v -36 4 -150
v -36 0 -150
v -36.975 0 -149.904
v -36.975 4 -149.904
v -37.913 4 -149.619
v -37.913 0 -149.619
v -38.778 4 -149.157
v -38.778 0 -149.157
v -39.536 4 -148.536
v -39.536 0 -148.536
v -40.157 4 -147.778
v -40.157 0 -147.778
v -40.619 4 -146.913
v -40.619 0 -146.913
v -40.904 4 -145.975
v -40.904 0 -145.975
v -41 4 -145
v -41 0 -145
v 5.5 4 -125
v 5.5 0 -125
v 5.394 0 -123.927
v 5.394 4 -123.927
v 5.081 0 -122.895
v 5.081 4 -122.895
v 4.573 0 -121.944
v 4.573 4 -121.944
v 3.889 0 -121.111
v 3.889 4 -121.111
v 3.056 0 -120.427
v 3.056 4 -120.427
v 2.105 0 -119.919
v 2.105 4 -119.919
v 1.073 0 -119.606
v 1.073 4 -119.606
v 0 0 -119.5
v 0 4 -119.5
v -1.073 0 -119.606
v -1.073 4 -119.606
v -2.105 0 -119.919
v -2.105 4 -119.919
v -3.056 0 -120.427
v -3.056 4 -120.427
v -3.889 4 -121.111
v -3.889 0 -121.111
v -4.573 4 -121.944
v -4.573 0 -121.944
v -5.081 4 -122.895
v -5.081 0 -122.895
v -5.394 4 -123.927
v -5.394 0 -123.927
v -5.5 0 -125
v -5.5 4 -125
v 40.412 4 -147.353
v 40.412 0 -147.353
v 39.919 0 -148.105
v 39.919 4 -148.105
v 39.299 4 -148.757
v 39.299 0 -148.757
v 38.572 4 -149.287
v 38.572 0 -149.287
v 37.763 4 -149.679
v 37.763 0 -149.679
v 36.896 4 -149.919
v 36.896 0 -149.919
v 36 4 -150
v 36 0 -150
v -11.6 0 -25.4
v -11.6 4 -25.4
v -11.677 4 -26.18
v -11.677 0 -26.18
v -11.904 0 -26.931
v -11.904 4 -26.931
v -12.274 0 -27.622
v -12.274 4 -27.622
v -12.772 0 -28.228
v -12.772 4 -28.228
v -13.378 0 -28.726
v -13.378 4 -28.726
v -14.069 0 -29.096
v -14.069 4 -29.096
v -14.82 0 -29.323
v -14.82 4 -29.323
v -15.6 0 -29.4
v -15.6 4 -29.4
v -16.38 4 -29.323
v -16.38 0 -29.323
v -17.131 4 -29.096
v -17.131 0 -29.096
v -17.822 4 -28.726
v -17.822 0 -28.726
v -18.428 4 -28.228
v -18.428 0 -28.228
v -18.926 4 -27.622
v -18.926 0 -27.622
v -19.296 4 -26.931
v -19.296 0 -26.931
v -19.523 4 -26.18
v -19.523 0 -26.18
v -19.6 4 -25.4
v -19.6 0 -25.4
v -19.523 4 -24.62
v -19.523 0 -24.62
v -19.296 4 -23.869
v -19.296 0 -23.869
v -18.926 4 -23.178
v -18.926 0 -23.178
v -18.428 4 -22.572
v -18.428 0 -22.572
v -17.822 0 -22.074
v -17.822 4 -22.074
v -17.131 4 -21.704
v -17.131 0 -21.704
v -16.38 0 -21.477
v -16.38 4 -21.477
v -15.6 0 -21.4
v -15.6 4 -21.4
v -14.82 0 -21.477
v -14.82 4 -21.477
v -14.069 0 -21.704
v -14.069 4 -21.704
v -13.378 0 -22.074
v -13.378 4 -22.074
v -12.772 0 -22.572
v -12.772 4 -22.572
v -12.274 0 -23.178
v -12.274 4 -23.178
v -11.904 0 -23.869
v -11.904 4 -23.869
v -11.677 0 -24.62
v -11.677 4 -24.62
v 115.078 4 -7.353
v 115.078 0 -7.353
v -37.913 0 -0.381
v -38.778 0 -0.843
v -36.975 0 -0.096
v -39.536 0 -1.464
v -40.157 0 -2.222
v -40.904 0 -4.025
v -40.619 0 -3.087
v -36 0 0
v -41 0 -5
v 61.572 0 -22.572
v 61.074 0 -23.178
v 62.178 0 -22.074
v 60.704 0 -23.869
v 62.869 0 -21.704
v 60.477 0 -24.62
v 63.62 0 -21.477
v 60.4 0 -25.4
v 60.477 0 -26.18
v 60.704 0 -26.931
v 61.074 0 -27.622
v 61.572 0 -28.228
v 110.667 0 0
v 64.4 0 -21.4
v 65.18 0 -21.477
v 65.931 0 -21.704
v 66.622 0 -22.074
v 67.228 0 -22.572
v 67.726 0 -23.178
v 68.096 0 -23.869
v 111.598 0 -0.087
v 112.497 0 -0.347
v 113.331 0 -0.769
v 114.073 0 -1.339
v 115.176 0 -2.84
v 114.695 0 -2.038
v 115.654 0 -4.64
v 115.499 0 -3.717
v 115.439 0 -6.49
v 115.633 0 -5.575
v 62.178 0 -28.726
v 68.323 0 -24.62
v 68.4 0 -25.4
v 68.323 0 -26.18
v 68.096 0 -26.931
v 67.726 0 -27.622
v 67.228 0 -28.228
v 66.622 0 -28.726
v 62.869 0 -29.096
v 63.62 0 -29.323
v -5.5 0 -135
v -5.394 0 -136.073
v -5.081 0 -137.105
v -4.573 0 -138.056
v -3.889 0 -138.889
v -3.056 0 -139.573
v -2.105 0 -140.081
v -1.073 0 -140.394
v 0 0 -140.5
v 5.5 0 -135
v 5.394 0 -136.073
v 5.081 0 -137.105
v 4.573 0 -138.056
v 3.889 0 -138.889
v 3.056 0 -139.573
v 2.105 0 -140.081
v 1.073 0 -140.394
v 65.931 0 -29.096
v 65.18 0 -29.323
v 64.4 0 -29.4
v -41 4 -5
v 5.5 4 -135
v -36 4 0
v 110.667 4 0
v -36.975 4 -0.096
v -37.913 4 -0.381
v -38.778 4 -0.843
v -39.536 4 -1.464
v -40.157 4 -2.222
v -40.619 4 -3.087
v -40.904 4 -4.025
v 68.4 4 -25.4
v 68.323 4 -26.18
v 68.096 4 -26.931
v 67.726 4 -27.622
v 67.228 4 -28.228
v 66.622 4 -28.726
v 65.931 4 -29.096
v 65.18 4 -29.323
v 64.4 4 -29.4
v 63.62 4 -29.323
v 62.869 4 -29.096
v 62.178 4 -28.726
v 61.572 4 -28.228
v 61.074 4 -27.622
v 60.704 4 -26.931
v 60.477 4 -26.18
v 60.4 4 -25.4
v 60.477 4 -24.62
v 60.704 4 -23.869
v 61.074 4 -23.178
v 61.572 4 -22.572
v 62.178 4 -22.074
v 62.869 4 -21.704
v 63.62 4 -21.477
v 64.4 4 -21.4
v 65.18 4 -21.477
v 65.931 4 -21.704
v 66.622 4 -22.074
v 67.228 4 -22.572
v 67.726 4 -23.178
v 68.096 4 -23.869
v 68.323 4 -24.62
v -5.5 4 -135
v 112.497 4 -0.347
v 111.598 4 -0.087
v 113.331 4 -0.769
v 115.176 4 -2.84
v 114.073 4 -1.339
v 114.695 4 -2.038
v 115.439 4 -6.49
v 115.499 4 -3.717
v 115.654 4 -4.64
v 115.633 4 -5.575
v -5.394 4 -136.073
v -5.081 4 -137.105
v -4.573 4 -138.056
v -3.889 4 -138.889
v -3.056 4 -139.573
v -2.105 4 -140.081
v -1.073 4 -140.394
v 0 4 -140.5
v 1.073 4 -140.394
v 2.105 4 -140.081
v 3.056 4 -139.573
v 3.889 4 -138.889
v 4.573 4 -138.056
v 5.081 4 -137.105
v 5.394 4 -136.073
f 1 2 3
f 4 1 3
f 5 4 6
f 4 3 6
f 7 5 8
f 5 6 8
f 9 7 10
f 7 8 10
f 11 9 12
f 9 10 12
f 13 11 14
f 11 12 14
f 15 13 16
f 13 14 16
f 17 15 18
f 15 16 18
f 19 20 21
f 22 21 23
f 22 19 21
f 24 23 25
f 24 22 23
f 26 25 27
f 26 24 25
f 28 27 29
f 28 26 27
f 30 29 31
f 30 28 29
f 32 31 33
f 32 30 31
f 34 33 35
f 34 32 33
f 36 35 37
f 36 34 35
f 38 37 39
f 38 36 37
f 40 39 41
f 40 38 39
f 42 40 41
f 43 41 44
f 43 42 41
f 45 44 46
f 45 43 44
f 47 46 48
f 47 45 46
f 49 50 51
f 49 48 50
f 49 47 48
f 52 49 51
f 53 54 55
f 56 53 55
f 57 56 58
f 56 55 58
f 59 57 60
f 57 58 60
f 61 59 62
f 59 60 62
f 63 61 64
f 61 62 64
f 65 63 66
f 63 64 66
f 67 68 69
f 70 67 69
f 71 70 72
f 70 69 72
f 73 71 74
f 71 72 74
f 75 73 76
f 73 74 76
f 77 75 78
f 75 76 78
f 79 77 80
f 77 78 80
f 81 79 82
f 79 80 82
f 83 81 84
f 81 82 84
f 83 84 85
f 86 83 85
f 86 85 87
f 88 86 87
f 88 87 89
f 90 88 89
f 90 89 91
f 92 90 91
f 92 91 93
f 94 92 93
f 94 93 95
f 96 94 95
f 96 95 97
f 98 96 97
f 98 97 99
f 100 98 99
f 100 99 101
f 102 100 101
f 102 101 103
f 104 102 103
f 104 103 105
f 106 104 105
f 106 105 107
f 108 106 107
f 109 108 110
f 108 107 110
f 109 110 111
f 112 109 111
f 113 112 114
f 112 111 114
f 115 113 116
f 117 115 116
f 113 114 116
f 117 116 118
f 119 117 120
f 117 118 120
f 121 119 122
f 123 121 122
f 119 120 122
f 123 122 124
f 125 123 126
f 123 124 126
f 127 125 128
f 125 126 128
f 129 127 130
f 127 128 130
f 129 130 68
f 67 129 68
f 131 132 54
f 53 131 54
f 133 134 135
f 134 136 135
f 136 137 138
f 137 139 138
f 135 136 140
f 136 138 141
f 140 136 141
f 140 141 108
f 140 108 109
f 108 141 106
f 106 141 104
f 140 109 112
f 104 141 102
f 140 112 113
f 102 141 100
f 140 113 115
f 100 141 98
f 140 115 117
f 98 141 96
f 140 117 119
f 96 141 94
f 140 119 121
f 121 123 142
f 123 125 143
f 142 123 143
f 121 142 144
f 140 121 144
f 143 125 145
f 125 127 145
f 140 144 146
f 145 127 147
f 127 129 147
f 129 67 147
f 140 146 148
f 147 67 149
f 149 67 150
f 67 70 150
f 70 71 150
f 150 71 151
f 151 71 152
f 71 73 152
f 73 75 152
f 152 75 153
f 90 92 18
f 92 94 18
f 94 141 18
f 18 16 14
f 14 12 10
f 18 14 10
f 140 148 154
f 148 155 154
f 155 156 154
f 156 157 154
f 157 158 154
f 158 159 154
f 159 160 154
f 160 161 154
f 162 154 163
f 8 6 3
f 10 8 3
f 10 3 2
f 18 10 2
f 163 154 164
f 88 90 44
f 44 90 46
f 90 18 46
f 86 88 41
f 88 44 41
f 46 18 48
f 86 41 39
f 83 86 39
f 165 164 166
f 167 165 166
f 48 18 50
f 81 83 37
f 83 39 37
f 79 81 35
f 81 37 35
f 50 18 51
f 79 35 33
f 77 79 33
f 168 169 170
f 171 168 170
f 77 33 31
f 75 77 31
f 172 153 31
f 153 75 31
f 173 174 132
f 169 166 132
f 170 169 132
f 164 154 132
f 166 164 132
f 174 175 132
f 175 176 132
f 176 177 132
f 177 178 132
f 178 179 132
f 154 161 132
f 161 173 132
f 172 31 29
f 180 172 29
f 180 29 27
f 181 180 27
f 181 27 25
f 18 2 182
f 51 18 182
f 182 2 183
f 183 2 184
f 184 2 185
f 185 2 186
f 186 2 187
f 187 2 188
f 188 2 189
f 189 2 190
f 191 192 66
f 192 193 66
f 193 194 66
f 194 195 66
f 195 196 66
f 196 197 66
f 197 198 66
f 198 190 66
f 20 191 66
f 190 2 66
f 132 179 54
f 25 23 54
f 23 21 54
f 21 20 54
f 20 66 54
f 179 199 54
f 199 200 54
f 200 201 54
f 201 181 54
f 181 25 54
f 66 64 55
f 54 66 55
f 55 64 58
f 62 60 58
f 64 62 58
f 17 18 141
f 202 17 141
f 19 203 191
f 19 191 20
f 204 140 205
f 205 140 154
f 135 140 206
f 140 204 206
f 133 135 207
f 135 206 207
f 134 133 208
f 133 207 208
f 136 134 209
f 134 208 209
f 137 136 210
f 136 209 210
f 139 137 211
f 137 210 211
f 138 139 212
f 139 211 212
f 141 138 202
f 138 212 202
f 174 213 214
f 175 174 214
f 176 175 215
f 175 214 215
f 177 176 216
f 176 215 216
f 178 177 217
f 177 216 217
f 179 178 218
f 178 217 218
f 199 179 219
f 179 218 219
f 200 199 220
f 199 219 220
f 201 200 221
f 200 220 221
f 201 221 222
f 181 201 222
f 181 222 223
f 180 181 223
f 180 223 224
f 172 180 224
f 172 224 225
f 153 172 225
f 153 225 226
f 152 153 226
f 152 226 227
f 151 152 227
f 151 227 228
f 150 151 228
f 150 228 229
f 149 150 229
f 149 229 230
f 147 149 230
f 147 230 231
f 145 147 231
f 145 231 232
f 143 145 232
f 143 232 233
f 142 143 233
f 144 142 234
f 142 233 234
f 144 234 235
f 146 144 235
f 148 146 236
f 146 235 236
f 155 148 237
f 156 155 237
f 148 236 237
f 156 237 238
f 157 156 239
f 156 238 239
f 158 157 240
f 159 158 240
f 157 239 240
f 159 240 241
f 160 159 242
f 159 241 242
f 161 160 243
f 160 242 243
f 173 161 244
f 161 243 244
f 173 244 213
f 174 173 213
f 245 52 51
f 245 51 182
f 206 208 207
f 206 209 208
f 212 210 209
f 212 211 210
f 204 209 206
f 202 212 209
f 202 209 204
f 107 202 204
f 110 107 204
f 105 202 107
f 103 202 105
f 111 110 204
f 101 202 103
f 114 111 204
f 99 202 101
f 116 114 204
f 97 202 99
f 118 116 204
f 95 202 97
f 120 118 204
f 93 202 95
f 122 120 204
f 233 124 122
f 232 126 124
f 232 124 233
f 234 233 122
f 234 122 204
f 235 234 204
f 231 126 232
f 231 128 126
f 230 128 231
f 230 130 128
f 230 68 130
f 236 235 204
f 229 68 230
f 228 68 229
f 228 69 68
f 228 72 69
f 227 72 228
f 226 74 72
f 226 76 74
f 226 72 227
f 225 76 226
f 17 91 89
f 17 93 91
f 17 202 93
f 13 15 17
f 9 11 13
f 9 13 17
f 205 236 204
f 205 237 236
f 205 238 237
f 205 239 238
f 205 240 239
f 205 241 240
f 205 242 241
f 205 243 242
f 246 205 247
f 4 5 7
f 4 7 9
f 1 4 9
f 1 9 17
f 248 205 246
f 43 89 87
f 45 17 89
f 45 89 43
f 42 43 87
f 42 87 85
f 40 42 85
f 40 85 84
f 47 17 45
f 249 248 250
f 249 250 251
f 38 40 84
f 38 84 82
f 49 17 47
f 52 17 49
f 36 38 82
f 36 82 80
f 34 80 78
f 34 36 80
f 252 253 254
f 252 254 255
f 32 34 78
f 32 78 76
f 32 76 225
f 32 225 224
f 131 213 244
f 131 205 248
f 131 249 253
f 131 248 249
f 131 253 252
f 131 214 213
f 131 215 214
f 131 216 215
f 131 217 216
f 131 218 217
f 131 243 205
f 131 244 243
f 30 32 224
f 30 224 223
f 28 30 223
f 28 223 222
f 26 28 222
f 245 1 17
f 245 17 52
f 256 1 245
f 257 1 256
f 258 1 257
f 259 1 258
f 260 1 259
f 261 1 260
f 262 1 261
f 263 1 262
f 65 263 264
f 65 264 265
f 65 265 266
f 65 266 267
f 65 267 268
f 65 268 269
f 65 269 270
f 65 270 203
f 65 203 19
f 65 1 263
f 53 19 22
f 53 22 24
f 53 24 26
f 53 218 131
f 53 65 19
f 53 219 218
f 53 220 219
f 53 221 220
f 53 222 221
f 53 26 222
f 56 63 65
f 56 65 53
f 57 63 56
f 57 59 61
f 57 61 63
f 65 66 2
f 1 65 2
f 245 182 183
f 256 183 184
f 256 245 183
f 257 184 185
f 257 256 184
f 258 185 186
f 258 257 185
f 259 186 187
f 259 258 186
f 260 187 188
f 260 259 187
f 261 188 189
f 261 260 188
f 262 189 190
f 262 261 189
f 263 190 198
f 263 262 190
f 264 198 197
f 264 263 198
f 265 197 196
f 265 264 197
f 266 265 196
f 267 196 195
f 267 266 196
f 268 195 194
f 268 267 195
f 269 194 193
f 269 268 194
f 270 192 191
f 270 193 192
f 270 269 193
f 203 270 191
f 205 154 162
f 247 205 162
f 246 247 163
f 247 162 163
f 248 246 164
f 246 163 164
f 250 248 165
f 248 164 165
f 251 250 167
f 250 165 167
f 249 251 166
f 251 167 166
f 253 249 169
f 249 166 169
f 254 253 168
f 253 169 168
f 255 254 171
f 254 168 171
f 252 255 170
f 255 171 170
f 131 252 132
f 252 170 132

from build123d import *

# Parameters (mm, degrees)
BOSS_EXTRUDE1_DEPTH = 4
SKETCH3_R           = 4
CUT_EXTRUDE1_DEPTH  = 5
FILLET1_R           = 5


with BuildPart() as part:
    # Sketch2 → Boss-Extrude1 (new body)
    with BuildSketch(Plane(origin=(0, 0, 0), x_dir=(1, 0, 0), z_dir=(0, 1, 0))):
        with BuildLine():
            Line((-41, 0), (110.666666667, 0))
            ThreePointArc((110.666666667, 0), (114.954131295, 2.427521223), (115.078431373, 7.352941176))
            Line((115.078431373, 7.352941176), (40.411764706, 147.352941176))
            ThreePointArc((40.411764706, 147.352941176), (38.572478777, 149.287464629), (36, 150))
            Line((36, 150), (-36, 150))
            ThreePointArc((-36, 150), (-39.535533906, 148.535533906), (-41, 145))
            Line((-41, 145), (-41, 0))
        make_face()
    extrude(amount=BOSS_EXTRUDE1_DEPTH)

    # Sketch3 → Cut-Extrude1 (cut, through all)
    with BuildSketch(Plane(origin=(0, 4, 0), x_dir=(1, 0, 0), z_dir=(0, 1, 0))):
        with Locations((-15.6, 25.4)):
            Circle(SKETCH3_R)
        with Locations((64.4, 25.4)):
            Circle(SKETCH3_R)
        with BuildLine():
            Line((5.5, 135), (5.5, 125))
            ThreePointArc((5.5, 125), (0, 119.5), (-5.5, 125))
            Line((-5.5, 125), (-5.5, 135))
            ThreePointArc((-5.5, 135), (0, 140.5), (5.5, 135))
        make_face()
    extrude(amount=-CUT_EXTRUDE1_DEPTH, mode=Mode.SUBTRACT)

    # Fillet1
    fillet1_edges = [part.edges().sort_by_distance(p)[0] for p in [
        (-41, 2, 0),
    ]]
    fillet(fillet1_edges, radius=FILLET1_R)


solid = part.part
